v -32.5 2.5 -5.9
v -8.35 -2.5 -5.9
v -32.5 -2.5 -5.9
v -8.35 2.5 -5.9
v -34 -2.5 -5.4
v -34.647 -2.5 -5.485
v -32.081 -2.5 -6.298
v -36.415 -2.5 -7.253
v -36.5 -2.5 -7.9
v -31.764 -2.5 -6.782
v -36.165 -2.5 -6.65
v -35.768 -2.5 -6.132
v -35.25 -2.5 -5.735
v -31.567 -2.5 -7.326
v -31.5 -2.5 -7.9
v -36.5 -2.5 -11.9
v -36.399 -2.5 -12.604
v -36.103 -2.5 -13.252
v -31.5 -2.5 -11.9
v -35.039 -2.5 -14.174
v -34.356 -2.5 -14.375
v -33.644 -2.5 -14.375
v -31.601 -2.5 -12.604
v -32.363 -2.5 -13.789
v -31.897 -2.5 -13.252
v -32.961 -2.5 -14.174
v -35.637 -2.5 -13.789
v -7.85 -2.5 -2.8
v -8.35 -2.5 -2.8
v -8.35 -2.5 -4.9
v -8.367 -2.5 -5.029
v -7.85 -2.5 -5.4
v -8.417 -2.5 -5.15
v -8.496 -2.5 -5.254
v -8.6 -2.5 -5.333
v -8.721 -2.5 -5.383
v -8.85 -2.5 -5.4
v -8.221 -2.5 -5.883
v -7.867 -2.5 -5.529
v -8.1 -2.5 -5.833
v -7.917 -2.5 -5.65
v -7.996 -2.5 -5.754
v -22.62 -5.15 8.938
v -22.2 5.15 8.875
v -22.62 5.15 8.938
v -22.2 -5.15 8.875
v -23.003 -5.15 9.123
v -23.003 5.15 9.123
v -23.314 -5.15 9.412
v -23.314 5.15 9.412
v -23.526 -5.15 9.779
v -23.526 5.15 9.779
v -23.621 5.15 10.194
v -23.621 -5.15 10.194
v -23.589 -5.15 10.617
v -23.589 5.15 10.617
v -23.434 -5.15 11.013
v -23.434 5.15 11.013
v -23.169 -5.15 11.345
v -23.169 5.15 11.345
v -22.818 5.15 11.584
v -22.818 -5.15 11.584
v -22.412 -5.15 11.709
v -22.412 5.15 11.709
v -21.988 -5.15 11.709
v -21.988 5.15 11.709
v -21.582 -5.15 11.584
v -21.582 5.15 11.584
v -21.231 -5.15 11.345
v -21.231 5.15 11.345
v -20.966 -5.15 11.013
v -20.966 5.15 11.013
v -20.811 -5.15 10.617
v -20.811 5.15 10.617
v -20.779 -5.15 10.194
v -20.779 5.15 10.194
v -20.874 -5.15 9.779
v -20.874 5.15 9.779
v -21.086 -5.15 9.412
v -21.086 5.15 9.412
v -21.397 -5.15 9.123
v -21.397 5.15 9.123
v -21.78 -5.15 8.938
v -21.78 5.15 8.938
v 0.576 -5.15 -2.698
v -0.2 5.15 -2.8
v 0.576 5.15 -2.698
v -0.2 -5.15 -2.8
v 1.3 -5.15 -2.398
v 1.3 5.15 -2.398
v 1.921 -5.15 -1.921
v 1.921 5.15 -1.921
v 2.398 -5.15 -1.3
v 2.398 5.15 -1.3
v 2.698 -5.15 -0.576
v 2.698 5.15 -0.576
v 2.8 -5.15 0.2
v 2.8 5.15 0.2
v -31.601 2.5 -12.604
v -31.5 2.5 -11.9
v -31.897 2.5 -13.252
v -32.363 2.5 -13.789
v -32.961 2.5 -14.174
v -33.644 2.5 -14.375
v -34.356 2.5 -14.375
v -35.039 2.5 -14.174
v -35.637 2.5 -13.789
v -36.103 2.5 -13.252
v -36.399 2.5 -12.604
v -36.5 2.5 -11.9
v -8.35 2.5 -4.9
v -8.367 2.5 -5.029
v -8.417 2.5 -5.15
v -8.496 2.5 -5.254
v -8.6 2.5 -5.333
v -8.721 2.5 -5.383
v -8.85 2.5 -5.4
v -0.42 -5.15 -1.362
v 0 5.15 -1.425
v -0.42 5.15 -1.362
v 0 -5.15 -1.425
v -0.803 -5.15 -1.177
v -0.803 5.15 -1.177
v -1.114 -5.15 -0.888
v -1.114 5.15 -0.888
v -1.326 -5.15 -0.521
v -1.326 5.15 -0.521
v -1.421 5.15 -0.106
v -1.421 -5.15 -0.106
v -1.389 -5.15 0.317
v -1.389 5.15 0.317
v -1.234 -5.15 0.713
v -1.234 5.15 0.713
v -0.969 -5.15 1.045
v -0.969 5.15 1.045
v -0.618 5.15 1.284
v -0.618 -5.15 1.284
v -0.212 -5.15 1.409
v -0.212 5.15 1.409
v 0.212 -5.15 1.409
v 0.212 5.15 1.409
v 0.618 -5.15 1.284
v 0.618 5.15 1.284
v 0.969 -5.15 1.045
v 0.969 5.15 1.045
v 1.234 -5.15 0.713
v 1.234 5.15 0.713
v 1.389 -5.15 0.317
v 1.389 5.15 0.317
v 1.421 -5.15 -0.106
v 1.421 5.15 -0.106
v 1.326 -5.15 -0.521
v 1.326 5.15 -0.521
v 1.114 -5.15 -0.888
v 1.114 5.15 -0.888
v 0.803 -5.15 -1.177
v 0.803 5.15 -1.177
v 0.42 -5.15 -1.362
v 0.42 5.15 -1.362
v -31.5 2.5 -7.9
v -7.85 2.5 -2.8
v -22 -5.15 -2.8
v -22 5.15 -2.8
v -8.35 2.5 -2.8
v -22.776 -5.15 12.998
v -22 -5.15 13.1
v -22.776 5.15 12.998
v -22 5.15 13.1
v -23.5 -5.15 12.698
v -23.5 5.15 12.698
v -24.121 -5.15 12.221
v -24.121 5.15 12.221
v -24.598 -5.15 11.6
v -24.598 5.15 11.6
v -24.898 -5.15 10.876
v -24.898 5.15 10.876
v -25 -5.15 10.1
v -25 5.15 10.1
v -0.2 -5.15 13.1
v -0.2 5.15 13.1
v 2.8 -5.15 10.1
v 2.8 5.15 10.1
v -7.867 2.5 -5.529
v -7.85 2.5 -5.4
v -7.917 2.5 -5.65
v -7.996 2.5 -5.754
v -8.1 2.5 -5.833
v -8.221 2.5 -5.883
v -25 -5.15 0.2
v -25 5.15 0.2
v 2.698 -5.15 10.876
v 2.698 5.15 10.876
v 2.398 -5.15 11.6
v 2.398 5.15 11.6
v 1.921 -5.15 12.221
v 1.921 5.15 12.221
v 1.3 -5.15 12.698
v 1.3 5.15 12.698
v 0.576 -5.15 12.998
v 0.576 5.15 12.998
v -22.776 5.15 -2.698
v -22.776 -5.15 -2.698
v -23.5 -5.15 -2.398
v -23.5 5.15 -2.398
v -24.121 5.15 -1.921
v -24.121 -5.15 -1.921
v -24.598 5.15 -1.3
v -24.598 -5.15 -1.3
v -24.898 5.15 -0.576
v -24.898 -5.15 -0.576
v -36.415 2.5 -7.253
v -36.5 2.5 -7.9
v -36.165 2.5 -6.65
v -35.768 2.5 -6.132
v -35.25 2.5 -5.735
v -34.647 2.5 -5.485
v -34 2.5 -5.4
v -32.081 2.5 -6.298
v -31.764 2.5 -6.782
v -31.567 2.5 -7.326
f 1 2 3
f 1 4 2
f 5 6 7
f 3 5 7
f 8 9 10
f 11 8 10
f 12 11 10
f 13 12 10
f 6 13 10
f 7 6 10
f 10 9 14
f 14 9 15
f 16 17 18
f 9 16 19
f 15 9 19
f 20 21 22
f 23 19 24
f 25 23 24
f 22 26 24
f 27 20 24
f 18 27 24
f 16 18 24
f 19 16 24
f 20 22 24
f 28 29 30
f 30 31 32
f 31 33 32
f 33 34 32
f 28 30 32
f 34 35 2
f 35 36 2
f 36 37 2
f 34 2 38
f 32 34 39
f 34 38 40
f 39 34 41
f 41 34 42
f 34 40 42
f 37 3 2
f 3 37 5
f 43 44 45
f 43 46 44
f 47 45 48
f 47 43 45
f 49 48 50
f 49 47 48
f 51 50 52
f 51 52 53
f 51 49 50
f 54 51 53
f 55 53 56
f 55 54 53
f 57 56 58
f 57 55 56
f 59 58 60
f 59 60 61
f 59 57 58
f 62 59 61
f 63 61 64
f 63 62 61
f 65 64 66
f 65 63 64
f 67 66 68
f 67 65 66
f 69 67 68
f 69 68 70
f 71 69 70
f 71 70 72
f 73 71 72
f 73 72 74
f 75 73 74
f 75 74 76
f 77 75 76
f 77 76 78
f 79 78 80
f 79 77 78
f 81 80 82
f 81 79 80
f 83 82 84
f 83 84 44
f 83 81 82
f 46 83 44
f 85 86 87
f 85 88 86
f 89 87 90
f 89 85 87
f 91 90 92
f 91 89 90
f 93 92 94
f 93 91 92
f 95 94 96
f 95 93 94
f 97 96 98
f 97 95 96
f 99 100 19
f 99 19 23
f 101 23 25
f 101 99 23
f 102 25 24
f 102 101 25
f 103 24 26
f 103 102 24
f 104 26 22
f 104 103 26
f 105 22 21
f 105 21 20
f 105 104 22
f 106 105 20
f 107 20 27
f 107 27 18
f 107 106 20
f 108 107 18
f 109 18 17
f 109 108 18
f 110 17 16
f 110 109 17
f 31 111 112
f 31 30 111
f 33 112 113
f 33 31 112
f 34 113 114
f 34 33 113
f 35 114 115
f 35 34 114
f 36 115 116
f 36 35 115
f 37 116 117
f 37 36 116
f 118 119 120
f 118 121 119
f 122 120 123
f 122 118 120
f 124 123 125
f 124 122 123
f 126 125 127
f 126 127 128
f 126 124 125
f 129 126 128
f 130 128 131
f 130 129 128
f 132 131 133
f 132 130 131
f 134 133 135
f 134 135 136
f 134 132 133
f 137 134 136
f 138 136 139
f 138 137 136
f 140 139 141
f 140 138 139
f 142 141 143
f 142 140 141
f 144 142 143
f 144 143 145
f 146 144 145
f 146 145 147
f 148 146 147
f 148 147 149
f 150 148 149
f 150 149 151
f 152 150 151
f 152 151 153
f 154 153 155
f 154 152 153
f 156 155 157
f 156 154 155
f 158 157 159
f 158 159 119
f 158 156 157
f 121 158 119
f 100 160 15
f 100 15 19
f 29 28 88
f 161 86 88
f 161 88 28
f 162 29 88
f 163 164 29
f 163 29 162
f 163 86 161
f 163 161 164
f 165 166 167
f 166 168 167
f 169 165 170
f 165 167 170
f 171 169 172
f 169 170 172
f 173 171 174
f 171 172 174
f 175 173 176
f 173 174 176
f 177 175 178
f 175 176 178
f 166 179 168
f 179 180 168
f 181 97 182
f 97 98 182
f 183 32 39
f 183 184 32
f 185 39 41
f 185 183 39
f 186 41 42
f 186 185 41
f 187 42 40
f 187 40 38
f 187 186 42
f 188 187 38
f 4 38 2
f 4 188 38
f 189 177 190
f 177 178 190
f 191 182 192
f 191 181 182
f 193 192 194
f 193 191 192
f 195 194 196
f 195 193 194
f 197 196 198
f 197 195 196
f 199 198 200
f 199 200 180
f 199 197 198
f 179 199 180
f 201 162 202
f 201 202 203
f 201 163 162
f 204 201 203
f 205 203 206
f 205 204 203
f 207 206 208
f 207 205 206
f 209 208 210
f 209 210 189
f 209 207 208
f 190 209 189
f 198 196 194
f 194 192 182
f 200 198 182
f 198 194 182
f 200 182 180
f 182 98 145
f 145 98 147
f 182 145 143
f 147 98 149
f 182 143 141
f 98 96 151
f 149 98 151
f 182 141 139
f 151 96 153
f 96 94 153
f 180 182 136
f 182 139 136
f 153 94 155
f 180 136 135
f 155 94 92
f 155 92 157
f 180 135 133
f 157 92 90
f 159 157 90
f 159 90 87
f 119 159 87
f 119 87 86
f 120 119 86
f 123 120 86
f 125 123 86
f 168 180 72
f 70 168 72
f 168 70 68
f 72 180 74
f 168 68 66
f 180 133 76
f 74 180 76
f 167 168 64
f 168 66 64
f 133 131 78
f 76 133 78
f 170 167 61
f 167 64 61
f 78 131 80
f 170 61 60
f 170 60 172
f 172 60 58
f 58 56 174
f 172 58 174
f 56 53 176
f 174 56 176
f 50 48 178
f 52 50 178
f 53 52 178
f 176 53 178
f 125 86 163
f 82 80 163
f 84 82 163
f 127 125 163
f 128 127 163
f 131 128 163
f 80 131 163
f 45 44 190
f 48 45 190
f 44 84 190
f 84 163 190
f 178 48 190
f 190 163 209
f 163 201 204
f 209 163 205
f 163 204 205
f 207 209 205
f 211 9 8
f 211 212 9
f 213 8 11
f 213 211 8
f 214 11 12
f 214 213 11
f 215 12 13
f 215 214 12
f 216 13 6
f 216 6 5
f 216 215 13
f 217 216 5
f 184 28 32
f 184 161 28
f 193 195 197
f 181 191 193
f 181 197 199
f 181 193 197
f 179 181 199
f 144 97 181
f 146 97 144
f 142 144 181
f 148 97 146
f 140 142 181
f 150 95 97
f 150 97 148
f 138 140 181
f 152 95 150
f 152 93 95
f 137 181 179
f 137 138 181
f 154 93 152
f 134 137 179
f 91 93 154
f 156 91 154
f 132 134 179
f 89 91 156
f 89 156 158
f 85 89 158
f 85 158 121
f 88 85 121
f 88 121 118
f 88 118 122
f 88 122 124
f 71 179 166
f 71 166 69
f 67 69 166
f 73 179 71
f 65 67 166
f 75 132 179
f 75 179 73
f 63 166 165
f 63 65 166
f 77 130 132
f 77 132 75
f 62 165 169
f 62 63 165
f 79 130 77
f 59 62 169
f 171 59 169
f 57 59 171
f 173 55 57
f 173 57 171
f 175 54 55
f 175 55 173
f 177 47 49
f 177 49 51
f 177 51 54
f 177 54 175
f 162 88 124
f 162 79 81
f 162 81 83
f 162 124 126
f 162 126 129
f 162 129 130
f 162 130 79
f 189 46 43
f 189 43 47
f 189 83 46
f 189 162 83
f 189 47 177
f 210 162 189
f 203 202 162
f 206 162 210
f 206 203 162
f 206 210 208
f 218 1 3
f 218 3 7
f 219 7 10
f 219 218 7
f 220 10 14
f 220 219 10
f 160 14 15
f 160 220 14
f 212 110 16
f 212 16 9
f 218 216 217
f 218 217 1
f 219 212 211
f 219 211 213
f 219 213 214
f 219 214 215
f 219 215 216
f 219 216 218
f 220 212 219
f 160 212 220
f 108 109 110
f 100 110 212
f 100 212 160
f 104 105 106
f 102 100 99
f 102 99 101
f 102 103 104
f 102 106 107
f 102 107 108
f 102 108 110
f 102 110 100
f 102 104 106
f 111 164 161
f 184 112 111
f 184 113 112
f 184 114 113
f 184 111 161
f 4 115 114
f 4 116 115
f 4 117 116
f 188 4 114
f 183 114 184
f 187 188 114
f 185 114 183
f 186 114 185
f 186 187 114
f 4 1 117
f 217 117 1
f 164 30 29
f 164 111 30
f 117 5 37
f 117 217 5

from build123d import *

# Parameters (mm, degrees)
SKETCH1_R           = 1.425
BOSS_EXTRUDE1_DEPTH = 5.15
FILLET1_R           = 3
BOSS_EXTRUDE2_DEPTH = 2.5
FILLET2_R           = 0.5


with BuildPart() as part:
    # Sketch1 → Boss-Extrude1 (new, symmetric)
    with BuildSketch(Plane(origin=(0, 0, 0), x_dir=(1, 0, 0), z_dir=(0, 1, 0))):
        Polygon((-8.35, 2.8), (-25, 2.8), (-25, -13.1), (2.8, -13.1), (2.8, 2.8), (-7.85, 2.8), (-8.1, 2.8), align=None)
        with Locations((-22.2, -10.3)):
            Circle(SKETCH1_R, mode=Mode.SUBTRACT)
        Circle(SKETCH1_R, mode=Mode.SUBTRACT)
    extrude(amount=BOSS_EXTRUDE1_DEPTH, both=True)

    # Fillet1
    fillet1_edges = [part.edges().sort_by_distance(p)[0] for p in [
        (2.8, 0, -2.8),
        (2.8, 0, 13.1),
        (-25, 0, -2.8),
        (-25, 0, 13.1),
    ]]
    fillet(fillet1_edges, radius=FILLET1_R)

    # Sketch1<4> → Boss-Extrude2 (add, symmetric)
    with BuildSketch(Plane(origin=(0, 0, 0), x_dir=(1, 0, 0), z_dir=(0, 1, 0))):
        with BuildLine():
            Line((-8.35, 5.4), (-8.35, 2.8))
            Line((-8.35, 2.8), (-7.85, 2.8))
            Line((-7.85, 2.8), (-7.85, 5.9))
            Line((-7.85, 5.9), (-32.5, 5.9))
            ThreePointArc((-32.5, 5.9), (-31.763932023, 6.781966011), (-31.5, 7.9))
            Line((-31.5, 7.9), (-31.5, 11.9))
            ThreePointArc((-31.5, 11.9), (-34, 14.4), (-36.5, 11.9))
            Line((-36.5, 11.9), (-36.5, 7.9))
            ThreePointArc((-36.5, 7.9), (-35.767766953, 6.132233047), (-34, 5.4))
            Line((-34, 5.4), (-8.35, 5.4))
        make_face()
    extrude(amount=BOSS_EXTRUDE2_DEPTH, both=True)

    # Fillet2
    fillet2_edges = [part.edges().sort_by_distance(p)[0] for p in [
        (-7.85, 0, -5.9),
        (-8.35, 0, -5.4),
    ]]
    fillet(fillet2_edges, radius=FILLET2_R)


solid = part.part
